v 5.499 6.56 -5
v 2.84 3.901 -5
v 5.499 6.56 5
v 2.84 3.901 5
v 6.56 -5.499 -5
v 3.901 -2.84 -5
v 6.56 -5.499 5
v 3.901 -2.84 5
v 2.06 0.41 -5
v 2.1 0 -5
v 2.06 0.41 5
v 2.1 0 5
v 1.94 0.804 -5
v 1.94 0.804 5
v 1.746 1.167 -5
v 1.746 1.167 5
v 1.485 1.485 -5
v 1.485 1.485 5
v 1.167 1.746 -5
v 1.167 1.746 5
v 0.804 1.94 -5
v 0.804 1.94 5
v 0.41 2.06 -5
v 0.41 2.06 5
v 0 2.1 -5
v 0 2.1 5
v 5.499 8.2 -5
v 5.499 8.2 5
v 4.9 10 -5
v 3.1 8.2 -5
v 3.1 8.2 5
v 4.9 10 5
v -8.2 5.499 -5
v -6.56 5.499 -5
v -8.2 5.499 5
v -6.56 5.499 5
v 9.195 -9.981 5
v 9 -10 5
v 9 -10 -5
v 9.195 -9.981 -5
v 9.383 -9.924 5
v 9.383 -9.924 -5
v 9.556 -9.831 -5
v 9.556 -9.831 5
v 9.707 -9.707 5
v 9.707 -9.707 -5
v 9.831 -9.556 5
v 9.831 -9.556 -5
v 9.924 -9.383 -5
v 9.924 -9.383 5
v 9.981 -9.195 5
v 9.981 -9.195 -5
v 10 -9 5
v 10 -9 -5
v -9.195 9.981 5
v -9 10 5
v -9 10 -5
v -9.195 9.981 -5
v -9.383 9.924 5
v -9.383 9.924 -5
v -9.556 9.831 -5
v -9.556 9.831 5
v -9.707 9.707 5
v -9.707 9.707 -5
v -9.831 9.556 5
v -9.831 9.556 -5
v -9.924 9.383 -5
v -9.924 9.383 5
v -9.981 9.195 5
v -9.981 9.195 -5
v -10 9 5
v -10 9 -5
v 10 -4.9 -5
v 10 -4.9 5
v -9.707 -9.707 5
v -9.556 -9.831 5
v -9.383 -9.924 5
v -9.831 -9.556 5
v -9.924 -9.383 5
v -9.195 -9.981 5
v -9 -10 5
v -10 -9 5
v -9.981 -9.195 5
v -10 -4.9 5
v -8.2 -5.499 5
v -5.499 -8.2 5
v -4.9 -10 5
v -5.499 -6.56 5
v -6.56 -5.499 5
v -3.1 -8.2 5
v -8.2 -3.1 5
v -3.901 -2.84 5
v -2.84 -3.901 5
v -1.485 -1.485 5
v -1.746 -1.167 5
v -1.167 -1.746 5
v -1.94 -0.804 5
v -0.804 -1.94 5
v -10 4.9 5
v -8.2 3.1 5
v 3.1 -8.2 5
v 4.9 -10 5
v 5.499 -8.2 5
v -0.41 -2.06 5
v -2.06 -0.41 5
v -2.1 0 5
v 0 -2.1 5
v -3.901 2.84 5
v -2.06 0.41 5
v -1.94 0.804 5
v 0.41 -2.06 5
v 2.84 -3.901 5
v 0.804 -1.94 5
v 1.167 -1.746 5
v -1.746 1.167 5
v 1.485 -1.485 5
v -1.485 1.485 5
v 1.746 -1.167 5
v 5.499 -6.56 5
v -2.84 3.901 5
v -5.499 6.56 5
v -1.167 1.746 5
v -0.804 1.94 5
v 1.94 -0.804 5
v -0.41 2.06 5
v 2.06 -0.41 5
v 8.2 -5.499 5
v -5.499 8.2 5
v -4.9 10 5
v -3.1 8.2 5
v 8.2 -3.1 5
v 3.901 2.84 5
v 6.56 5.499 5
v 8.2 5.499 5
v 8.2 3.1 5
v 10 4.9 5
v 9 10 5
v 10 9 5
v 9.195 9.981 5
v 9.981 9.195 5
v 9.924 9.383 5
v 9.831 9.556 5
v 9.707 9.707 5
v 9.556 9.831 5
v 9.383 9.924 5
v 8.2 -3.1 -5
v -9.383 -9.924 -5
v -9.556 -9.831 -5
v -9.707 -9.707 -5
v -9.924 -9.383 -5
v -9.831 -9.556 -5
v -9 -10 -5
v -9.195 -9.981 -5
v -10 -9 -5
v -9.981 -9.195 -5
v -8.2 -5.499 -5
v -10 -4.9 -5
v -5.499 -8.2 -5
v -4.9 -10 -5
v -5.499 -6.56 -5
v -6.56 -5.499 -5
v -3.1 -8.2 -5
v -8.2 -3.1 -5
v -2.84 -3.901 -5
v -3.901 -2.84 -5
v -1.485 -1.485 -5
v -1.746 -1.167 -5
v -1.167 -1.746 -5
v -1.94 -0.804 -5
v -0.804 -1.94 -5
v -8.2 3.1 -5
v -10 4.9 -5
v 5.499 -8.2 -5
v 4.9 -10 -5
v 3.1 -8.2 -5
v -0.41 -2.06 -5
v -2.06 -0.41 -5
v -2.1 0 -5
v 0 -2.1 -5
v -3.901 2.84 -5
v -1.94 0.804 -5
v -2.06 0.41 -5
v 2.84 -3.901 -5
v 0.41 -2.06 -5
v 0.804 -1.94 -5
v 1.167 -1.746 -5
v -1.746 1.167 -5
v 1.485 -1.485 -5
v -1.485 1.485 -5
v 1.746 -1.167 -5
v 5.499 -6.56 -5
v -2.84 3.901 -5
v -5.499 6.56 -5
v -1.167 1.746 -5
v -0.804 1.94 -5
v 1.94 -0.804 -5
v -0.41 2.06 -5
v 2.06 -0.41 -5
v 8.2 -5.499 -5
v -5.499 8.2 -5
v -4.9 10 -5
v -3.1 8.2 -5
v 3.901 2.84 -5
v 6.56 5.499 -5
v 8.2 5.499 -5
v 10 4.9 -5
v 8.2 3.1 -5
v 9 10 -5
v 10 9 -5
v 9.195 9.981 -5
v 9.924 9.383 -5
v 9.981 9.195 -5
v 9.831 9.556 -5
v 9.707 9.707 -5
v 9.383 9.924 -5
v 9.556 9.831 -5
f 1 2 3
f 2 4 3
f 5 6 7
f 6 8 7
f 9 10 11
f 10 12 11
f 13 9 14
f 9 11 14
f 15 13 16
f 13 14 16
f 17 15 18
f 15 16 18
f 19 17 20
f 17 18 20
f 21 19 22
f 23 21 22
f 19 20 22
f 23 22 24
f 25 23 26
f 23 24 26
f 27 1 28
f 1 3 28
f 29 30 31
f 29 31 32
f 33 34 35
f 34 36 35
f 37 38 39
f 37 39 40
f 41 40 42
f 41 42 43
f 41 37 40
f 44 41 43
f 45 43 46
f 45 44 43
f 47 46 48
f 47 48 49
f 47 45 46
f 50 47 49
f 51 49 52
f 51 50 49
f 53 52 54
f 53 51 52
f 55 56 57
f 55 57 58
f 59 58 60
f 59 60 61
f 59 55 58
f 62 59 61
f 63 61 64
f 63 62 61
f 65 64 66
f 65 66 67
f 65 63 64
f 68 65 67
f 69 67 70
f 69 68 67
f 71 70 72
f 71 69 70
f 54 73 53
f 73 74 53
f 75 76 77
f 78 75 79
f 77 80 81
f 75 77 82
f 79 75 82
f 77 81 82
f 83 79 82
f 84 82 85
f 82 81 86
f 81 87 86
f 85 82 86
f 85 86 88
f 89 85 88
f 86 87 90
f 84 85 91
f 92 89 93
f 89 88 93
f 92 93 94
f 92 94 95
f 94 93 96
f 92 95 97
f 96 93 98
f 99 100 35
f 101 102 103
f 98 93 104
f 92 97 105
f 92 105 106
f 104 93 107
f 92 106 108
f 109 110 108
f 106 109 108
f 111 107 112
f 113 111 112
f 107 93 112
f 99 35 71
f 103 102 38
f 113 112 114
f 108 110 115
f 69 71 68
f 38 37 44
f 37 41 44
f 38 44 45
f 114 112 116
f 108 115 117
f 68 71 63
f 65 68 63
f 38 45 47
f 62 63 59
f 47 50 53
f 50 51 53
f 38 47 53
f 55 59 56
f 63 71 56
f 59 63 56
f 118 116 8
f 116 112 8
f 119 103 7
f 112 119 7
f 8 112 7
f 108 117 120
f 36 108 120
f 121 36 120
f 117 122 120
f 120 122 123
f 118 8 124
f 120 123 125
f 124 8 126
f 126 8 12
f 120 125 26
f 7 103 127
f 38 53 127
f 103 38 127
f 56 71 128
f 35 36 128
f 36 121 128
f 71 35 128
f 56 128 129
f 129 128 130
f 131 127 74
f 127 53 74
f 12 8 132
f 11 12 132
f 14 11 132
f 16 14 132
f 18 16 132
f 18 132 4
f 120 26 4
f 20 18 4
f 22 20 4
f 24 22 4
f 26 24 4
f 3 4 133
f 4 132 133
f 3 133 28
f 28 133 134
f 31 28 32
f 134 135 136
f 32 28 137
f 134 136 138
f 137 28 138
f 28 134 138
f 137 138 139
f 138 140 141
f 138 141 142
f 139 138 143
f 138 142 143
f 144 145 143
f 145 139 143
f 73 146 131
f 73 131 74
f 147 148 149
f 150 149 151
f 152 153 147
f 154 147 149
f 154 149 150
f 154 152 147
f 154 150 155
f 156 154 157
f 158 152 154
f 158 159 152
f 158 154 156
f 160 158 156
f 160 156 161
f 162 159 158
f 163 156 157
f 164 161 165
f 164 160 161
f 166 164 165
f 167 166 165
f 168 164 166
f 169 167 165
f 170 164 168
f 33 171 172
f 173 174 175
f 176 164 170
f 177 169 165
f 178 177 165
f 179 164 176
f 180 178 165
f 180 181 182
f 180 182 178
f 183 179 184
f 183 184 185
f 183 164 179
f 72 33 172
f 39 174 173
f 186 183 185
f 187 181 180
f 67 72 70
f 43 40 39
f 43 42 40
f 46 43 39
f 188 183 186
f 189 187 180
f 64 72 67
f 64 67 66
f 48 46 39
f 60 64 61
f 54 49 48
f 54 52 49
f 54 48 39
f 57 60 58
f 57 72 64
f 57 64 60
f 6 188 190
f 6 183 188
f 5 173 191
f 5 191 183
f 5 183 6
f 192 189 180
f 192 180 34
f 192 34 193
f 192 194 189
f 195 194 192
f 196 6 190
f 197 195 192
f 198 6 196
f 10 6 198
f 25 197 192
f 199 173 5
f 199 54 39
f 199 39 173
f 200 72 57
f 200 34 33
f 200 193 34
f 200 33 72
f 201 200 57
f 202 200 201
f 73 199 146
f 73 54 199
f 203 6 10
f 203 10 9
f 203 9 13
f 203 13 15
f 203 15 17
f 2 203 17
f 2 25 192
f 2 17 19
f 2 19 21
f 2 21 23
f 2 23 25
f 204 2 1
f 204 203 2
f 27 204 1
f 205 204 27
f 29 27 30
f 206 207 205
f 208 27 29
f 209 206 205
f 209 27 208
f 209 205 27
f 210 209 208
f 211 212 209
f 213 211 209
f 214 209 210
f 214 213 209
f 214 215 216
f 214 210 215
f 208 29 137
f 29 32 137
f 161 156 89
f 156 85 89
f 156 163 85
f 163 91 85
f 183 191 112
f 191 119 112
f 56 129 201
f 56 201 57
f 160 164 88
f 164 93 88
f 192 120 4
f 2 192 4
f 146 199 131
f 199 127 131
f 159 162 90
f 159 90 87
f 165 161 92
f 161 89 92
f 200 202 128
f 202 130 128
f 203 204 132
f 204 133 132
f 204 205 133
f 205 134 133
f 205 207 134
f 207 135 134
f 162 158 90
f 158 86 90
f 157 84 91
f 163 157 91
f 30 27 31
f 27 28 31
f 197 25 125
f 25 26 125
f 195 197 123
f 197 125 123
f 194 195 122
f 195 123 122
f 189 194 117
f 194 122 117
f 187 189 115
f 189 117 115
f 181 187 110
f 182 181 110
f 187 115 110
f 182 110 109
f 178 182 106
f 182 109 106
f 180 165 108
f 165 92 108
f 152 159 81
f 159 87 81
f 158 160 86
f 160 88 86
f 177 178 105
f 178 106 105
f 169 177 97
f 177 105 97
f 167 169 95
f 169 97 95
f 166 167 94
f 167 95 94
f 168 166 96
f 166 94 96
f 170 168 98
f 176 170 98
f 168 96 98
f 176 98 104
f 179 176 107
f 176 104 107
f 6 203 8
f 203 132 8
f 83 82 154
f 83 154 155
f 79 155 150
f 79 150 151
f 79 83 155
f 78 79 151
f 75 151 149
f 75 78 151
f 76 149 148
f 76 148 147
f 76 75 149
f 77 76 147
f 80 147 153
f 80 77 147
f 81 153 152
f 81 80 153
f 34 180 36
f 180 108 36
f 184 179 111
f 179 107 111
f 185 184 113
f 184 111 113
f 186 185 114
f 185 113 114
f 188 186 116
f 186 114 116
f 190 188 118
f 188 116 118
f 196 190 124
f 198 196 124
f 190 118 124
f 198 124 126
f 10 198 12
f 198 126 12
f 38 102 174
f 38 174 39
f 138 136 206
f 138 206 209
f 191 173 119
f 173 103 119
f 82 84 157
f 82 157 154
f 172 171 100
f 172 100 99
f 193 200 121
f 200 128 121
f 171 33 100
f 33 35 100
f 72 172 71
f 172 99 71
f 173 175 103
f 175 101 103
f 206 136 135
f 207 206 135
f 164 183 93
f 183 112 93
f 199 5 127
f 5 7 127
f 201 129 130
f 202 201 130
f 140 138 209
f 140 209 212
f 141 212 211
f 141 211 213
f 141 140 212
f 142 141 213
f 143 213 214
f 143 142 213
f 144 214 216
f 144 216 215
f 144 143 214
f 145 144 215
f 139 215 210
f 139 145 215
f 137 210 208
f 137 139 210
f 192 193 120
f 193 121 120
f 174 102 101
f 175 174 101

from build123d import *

# Parameters (mm, degrees)
PAD_DEPTH          = 5
POLARPATTERN_COUNT = 4


with BuildPart() as part:
    # Sketch → Pad (new body, symmetric)
    with BuildSketch(Plane.XY):
        with BuildLine():
            Line((-4.9, 10), (-3.1, 8.2))
            Line((-3.1, 8.2), (-5.49934, 8.2))
            Line((-5.49934, 8.2), (-5.49934, 6.56))
            Line((-5.49934, 6.56), (-2.84, 3.90066))
            Line((-2.84, 3.90066), (0, 3.90066))
            Line((0, 3.90066), (0, 2.1))
            ThreePointArc((0, 2.1), (-1.484924, 1.484924), (-2.1, 0))
            Line((-3.90066, 0), (-2.1, 0))
            Line((-3.90066, 0), (-3.90066, 2.84))
            Line((-3.90066, 2.84), (-6.56, 5.49934))
            Line((-6.56, 5.49934), (-8.2, 5.49934))
            Line((-8.2, 5.49934), (-8.2, 3.1))
            Line((-8.2, 3.1), (-10, 4.9))
            Line((-10, 4.9), (-10, 9))
            ThreePointArc((-9, 10), (-9.707107, 9.707107), (-10, 9))
            Line((-4.9, 10), (-9, 10))
        make_face()
    pad = extrude(amount=PAD_DEPTH, both=True)

    # PolarPattern: Pad ×4 about axis
    polarpattern_axis = Axis((0, 0, 0), (0, 0, 1))
    for i in range(1, POLARPATTERN_COUNT):
        add(pad.rotate(polarpattern_axis, i * 360 / POLARPATTERN_COUNT))


solid = part.part
